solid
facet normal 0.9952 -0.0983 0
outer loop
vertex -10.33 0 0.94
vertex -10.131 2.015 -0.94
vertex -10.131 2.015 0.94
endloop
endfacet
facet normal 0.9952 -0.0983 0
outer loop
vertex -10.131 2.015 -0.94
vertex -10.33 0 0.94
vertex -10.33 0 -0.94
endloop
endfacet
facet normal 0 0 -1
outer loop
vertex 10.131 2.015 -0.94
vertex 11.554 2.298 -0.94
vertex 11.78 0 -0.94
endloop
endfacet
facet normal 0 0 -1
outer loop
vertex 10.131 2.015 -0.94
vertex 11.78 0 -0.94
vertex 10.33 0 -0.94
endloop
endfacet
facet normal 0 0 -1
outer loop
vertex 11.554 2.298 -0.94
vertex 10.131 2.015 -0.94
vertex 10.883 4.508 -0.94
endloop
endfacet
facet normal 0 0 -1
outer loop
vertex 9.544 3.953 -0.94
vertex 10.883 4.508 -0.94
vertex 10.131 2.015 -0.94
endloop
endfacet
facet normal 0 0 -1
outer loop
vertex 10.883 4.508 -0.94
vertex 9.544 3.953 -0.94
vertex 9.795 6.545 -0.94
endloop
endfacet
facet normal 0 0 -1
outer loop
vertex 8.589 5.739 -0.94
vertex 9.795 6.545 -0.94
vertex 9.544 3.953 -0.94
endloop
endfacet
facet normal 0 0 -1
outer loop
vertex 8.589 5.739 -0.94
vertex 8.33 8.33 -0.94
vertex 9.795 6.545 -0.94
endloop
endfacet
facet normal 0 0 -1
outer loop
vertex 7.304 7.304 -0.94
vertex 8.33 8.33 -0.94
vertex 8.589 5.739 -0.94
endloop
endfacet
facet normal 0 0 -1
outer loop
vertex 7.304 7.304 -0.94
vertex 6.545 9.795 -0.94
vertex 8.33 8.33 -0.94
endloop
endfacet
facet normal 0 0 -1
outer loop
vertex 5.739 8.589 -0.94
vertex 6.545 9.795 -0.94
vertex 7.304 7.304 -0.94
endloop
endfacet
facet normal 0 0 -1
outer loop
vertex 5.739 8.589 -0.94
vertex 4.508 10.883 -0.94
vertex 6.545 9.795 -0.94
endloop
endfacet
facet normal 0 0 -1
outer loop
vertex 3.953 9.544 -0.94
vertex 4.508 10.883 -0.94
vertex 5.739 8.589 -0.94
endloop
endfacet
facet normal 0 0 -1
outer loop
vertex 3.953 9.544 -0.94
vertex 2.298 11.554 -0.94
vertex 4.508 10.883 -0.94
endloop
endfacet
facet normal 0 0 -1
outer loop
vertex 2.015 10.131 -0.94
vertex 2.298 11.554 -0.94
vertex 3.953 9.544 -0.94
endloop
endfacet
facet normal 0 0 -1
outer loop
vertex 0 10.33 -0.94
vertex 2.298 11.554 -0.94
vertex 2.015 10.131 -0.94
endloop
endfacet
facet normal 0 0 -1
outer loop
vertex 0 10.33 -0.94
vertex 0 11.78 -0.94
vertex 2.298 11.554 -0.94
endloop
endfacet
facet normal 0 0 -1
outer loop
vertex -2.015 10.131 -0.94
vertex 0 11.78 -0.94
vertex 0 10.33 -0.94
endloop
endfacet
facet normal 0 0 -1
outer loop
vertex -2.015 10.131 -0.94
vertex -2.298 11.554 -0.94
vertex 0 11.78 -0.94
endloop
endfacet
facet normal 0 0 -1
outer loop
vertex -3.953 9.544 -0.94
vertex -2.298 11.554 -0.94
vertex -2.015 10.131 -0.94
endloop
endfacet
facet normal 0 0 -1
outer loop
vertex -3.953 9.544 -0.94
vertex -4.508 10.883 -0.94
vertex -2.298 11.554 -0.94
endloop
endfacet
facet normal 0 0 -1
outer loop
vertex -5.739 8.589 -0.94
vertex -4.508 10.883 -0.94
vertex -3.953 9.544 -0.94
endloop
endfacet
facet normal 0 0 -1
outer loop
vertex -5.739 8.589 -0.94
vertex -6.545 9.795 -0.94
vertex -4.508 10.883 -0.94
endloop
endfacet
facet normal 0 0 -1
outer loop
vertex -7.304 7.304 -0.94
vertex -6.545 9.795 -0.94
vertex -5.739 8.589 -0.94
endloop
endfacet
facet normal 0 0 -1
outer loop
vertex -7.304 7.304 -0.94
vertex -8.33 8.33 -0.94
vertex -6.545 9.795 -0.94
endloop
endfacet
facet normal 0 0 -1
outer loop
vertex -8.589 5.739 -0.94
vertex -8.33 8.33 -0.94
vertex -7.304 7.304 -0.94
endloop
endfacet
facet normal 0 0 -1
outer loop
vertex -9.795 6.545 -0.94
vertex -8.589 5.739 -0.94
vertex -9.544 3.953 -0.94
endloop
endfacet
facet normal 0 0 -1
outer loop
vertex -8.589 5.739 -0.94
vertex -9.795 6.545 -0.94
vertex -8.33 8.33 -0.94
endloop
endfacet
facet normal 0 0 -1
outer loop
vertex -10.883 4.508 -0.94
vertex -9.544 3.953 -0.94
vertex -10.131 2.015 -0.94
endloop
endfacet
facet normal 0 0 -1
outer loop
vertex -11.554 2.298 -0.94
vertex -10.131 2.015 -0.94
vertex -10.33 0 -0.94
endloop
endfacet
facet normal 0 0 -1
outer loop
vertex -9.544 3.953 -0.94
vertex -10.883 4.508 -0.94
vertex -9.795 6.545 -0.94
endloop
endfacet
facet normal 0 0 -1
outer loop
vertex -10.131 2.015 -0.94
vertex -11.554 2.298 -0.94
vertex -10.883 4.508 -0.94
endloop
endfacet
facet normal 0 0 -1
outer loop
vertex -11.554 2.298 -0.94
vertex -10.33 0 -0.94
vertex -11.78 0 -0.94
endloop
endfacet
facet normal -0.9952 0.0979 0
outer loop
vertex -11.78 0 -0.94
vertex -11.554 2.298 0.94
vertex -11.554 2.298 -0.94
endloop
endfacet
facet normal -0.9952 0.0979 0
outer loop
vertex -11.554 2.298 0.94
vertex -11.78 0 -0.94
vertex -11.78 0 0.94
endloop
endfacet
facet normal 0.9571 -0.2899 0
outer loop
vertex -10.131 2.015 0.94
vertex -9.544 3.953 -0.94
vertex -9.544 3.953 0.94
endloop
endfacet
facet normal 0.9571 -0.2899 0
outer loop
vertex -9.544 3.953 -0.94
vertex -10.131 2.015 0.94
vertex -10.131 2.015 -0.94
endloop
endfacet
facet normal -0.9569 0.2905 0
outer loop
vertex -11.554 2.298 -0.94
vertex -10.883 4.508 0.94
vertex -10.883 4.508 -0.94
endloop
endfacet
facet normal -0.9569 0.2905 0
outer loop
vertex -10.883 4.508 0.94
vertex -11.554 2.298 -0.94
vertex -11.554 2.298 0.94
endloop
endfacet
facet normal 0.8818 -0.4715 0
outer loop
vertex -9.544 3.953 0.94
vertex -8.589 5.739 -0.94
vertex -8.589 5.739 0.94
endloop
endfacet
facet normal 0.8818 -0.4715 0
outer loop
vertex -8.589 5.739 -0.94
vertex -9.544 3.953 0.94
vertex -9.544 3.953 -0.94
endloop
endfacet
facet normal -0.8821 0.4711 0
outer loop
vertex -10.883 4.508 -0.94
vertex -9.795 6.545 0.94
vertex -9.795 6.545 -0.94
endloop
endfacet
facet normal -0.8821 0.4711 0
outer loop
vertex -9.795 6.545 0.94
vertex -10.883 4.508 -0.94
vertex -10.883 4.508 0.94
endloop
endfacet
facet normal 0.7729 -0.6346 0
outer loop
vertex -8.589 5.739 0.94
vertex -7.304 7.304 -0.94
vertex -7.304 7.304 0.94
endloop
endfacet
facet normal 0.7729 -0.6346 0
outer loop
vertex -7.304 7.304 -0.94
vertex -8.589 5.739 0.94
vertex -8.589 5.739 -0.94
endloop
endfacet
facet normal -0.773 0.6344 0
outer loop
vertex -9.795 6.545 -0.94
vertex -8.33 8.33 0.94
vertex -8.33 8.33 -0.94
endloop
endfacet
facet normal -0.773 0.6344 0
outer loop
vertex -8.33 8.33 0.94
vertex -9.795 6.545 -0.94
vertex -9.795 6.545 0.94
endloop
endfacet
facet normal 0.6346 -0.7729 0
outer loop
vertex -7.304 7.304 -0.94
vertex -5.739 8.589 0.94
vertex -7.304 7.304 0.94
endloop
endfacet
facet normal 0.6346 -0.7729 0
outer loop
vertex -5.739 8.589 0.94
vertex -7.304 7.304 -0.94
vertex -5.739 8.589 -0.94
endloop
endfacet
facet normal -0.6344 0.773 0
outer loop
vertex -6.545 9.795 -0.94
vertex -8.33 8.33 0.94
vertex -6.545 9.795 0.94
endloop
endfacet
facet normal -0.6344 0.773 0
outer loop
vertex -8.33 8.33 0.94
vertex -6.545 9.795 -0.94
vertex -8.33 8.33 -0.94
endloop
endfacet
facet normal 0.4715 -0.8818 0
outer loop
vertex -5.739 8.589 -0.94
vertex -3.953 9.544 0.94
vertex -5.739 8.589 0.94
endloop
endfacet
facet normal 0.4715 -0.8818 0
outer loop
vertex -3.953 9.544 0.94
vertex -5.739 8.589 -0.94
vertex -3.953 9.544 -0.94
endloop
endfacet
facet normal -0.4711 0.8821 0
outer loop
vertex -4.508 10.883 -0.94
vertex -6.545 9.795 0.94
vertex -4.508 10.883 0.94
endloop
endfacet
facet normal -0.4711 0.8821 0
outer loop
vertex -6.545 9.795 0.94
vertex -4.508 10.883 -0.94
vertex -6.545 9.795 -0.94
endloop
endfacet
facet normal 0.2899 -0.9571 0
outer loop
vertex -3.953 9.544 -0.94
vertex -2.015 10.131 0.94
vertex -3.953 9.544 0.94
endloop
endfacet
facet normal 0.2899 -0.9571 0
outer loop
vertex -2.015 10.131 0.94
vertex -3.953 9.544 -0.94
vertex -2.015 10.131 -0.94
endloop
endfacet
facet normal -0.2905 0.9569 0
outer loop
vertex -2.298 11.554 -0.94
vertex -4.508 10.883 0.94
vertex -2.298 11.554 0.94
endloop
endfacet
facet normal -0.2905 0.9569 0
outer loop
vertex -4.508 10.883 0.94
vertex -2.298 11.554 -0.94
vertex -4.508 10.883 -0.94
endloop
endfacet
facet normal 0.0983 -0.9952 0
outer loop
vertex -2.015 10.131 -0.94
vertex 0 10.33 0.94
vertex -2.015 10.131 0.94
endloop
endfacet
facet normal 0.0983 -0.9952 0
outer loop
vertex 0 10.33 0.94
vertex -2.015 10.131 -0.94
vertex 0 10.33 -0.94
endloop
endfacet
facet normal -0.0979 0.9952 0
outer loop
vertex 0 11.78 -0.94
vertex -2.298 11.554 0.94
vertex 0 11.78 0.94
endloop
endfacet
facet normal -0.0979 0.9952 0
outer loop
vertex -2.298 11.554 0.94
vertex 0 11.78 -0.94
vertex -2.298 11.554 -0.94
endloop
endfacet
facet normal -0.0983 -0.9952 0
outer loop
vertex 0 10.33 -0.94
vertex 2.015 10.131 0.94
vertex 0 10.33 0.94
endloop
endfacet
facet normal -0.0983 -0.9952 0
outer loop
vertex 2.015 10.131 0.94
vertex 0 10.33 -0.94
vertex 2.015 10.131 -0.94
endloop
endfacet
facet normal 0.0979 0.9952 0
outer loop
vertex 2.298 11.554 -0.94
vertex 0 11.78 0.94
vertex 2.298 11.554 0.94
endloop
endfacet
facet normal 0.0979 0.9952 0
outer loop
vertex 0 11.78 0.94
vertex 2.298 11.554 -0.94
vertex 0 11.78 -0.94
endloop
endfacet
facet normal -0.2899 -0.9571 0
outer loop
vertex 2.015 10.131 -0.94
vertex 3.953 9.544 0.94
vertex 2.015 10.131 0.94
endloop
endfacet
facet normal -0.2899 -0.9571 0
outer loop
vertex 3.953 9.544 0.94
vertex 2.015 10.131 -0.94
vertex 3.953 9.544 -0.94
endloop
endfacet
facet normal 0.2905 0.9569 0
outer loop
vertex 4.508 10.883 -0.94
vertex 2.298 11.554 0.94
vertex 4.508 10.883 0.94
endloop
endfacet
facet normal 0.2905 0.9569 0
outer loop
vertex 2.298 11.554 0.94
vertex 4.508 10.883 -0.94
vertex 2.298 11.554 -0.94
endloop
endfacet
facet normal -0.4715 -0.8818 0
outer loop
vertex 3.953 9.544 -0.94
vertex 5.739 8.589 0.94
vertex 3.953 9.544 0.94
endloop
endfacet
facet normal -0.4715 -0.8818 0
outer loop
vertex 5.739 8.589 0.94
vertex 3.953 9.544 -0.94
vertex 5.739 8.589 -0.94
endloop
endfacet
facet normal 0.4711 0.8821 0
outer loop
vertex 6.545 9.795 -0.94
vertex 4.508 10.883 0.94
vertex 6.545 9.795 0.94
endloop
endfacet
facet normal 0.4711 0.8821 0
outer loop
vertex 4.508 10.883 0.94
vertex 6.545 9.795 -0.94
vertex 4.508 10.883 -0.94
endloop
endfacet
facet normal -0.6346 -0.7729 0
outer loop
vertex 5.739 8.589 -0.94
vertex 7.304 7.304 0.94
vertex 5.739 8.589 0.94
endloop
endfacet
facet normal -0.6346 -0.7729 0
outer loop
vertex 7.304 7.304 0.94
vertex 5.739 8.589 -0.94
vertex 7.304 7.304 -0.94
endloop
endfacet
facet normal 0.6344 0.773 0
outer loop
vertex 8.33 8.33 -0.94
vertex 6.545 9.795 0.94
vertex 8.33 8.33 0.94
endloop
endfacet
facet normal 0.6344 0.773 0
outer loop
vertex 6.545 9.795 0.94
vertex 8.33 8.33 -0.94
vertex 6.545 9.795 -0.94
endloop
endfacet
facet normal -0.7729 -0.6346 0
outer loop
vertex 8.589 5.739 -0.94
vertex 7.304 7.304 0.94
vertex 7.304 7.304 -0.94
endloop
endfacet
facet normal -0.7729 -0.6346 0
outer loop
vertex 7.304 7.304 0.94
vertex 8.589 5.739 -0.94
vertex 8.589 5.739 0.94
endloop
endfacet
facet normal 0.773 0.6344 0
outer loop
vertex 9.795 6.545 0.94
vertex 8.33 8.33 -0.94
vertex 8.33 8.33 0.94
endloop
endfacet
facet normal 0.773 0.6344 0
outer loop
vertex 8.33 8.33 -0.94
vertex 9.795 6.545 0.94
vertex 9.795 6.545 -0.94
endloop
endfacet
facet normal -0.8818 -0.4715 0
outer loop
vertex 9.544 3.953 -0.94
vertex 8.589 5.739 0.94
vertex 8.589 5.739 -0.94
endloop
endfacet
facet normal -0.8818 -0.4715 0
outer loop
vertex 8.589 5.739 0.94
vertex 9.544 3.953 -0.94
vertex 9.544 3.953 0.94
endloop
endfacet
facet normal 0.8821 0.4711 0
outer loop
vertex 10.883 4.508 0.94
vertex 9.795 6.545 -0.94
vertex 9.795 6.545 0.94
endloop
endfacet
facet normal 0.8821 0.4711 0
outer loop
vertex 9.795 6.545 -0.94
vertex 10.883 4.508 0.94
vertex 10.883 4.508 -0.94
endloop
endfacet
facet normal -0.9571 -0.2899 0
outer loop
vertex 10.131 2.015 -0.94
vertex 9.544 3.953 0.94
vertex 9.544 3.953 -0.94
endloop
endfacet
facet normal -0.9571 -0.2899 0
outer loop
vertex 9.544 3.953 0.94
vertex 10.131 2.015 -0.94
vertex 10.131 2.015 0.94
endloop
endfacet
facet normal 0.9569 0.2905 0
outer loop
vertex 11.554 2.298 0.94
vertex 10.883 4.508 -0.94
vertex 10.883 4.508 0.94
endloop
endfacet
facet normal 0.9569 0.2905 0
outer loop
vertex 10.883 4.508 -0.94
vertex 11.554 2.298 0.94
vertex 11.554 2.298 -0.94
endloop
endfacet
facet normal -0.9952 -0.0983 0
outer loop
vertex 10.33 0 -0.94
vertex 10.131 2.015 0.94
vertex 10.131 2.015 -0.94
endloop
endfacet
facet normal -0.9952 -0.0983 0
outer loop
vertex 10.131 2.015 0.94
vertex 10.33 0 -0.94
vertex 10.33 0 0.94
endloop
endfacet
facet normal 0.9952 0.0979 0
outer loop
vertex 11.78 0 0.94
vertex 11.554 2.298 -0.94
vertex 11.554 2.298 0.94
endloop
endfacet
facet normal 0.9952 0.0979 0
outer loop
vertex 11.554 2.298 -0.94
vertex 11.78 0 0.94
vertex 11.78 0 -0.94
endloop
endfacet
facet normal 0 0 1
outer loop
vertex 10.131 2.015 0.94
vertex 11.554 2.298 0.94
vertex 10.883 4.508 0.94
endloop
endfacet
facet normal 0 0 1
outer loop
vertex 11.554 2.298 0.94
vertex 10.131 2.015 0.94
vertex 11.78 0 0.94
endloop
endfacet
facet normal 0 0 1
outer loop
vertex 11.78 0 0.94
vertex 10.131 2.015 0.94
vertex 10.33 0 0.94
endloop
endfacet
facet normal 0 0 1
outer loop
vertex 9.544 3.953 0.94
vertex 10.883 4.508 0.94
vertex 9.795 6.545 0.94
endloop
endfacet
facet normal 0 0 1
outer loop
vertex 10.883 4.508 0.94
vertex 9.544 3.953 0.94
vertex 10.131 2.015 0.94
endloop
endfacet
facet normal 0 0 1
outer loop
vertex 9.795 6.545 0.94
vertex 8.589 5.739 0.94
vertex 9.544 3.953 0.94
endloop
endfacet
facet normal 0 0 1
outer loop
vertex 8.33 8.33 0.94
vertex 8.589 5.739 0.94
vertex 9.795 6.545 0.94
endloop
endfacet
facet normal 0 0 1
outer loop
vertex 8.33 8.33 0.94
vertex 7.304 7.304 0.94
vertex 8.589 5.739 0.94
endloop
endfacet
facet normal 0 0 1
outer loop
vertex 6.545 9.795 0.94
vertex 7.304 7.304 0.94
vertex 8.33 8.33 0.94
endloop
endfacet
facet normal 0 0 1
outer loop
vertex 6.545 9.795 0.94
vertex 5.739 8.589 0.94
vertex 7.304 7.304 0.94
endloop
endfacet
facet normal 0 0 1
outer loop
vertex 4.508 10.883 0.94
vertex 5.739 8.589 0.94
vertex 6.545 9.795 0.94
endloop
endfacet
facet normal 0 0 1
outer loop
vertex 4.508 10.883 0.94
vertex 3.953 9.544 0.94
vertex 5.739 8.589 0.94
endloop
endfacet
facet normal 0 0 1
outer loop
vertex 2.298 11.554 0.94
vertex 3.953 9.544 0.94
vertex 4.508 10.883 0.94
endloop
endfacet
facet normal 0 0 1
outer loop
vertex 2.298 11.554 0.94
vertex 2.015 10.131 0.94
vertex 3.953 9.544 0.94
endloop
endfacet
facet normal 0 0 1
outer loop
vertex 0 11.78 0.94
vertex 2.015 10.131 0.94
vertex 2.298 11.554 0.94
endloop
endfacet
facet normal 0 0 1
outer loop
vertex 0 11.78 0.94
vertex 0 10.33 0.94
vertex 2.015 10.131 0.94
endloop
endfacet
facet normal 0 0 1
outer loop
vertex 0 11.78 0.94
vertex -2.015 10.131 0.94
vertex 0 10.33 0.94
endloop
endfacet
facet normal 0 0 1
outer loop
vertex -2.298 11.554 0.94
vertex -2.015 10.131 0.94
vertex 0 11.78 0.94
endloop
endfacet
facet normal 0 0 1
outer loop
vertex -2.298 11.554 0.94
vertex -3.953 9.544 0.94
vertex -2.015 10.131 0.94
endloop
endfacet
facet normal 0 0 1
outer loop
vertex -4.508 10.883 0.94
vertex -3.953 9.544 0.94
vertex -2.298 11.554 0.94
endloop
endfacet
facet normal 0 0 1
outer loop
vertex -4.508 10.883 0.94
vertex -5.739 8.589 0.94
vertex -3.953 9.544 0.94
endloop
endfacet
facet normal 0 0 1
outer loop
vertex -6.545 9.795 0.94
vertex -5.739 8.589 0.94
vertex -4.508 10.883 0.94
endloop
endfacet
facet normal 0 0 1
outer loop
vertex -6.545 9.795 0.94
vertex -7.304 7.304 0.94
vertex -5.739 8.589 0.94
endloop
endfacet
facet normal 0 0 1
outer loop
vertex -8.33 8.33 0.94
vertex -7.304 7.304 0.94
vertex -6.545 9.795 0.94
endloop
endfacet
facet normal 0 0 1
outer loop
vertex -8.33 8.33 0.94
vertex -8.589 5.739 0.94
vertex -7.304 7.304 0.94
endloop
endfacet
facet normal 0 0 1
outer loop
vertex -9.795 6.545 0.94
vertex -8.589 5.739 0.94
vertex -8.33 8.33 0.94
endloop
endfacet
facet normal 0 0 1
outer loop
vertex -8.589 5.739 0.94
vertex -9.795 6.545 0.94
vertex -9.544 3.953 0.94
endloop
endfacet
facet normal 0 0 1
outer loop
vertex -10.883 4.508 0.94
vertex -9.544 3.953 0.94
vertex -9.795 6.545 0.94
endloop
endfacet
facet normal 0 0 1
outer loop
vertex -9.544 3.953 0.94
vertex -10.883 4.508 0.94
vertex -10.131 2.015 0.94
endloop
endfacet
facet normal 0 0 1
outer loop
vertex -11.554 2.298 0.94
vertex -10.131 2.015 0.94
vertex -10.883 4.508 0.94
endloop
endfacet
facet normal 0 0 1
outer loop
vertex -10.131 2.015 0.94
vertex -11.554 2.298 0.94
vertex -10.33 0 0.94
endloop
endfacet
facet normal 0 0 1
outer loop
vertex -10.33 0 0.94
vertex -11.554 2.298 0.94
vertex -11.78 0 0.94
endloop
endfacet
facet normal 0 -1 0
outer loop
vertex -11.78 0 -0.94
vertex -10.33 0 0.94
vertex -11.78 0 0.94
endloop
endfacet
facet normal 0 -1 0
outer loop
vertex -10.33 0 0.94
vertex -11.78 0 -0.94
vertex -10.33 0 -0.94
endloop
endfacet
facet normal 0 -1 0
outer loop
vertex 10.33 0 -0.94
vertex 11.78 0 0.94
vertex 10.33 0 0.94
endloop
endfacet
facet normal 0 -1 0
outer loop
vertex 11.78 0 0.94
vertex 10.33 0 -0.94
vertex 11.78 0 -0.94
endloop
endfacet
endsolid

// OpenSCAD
// file: ../stamp_generated.scad
// AUTO-GENERATED by scripts/Export-OpenScadStl.ps1 - do not edit by hand
// Source: print-stamp-config.json

info_stamp_line1 = "Verminology";
info_stamp_line2 = "Liquid Bait Station";
info_stamp_line3 = "v2.4.1 Prototype";
reservoir_stamp_bottom = false;
station_stamp_bottom = true;
needle_insert_export_stamp_bottom = false;
needle_gasket_export_stamp_bottom = false;
needle_seal_stamp_bottom = false;
// file: needle-insert.scad
// Needle insert + gasket ring modules. Include this (not `use`) so common.scad loads.
// F5 / STL: open this file directly — draws needle_insert() unless needle_insert_as_library is true before include.
// Base: union of two cylinders — bottom 1 mm @ inner_bait_barrier_id, upper 2 mm @ bottom OD − 2 mm (diametric).

include <common.scad>

// TPU torus: relaxed inner R < upper step R, outer R > upper step R. Centered on z=0; mate with translate(…, needle_gasket_assembly_z).
module needle_gasket_ring() {
    ri = needle_gasket_relaxed_inner_r;
    ro = needle_gasket_relaxed_outer_r;
    hz = needle_gasket_relaxed_z_half;
    render_if_needed()
        rotate_extrude(angle = 360, convexity = 4)
            polygon([
                [ri, -hz],
                [ro, -hz],
                [ro, hz],
                [ri, hz],
            ]);
}

// Six flex posts on upper base step (gasket land OD); top barb: two ramps at needle_insert_clip_top_barb_slope_deg, extruded across w.
module needle_insert_retention_clip_top_barb(L, w, h_barb, apex_r) {
    hm = h_barb / 2;
    translate([0, w / 2, 0])
        rotate([90, 0, 0])
            linear_extrude(height = w, convexity = 4)
                polygon([
                    [0, 0],
                    [L, 0],
                    [L + apex_r, hm],
                    [L, h_barb],
                    [0, h_barb],
                ]);
}

module needle_insert_retention_clips() {
    R = needle_insert_gasket_land_od / 2;
    w = needle_insert_clip_tangent_width_mm;
    ad = needle_insert_clip_anchor_depth_mm;
    stem = needle_insert_clip_stem_radial_mm;
    L = ad + stem;
    h_barb = needle_insert_clip_top_barb_h_mm;
    apex_r = needle_insert_clip_top_barb_apex_radial_mm;
    z_step = needle_insert_base_bottom_h;
    z0 = needle_insert_clip_z0_above_gasket_step_mm + needle_insert_clip_stem_bottom_trim_mm;
    z_body_top = needle_insert_clip_body_z_top - z_step;
    z_barb_base = z_body_top - needle_insert_clip_top_barb_drop_mm;
    ri = needle_insert_clip_retention_radial_inset_mm;
    assert(z_barb_base > z0 + 0.05, "barb drop too large vs stem height");
    for (i = [0 : needle_insert_clip_count - 1])
        rotate([0, 0, needle_insert_clip_phase_deg + i * (360 / needle_insert_clip_count)])
            render_if_needed()
                translate([0, 0, z_step])
                    union() {
                        translate([R - L - ri, -w / 2, z0])
                            cube([L, w, z_barb_base - z0]);
                        translate([R - L - ri, 0, z_barb_base])
                            needle_insert_retention_clip_top_barb(L, w, h_barb, apex_r);
                    }
}

// Lower base step — plain cylinder only (no groove, no difference).
module needle_insert_base_bottom_cylinder() {
    cylinder(h = needle_insert_base_bottom_h, d = needle_insert_base_bottom_od);
}

// Upper base step — second cylinder only (stacked on bottom).
module needle_insert_base_upper_cylinder() {
    translate([0, 0, needle_insert_base_bottom_h])
        cylinder(h = needle_insert_base_gasket_step_h, d = needle_insert_gasket_land_od);
}

module needle_insert_channels() {
    // Vertical: from bottom of lateral port up (not through z=0 below lateral).
    vb = max(0, pin_channel_z_bottom);
    vh = pin_top + 0.5 - vb;
    translate([0, 0, vb])
        cylinder(h = vh, d = pin_channel_dia);
    translate([pin_tunnel_x_center, 0, pin_tunnel_z])
        rotate([0, 90, 0])
            cylinder(h = pin_tunnel_reach, d = pin_channel_dia, center = true);
}

// Solid: union(two base cylinders, pin…); channels subtract through the stack.
module needle_insert() {
    sh = pin_top - pin_tip_taper_h - needle_insert_disk_h;
    render_if_needed()
        difference() {
            union() {
                needle_insert_base_bottom_cylinder();
                needle_insert_base_upper_cylinder();
                translate([0, 0, needle_insert_disk_h]) {
                    cylinder(h = sh, d = pin_dia);
                    translate([0, 0, sh])
                        cylinder(h = pin_tip_taper_h, d1 = pin_dia, d2 = pin_tip_od);
                }
                if (needle_insert_retention_clips_enabled)
                    needle_insert_retention_clips();
            }
            needle_insert_channels();
        }
}

// Pocket: max of (bottom OD, land + barb) + clearance — not id2+c+apex as extra (that oversize erased inner barrier ring).
// Capped below inner barrier ring OD so the subtract cannot hollow the full annulus (watertight wall).
module needle_insert_pocket() {
    c = needle_insert_pocket_clearance;
    ze = needle_insert_pocket_z_extra;
    r_body = needle_insert_base_bottom_od / 2 + c;
    r_barb = needle_insert_retention_clips_enabled
        ? needle_insert_gasket_land_od / 2 + needle_insert_clip_top_barb_apex_radial_mm + c
            - needle_insert_clip_retention_radial_inset_mm
        : 0;
    r_need = max(r_body, r_barb);
    r_cap = inner_bait_barrier_od / 2 - needle_insert_pocket_inner_barrier_min_wall_mm;
    r_clip = min(r_need, r_cap);
    assert(r_need <= r_cap + 0.02, "needle pocket exceeds inner barrier OD cap — reduce barb apex or slope");
    z_barb = needle_insert_retention_clips_enabled ? needle_insert_clip_top_barb_h_mm : 0;
    z_drop = needle_insert_retention_clips_enabled ? needle_insert_clip_top_barb_drop_mm : 0;
    z_clip_top = max(
        inner_barrier_rail_z_top + 0.08,
        needle_insert_clip_body_z_top - z_drop + z_barb + needle_insert_pocket_z_above_clip_post_mm);
    translate([0, 0, -0.02])
        union() {
            cylinder(h = z_clip_top + 0.02 + ze, r = r_clip);
            translate([0, 0, z_clip_top])
                cylinder(h = pin_top - z_clip_top + 0.5 + ze, d = pin_dia + 2 * c);
        }
}

if (is_undef(needle_insert_as_library) || !needle_insert_as_library)
    needle_insert();
// main file
// Needle insert base TPU ring — print ~90A. Torus: stretch over upper base step OD (no groove on insert).

needle_insert_as_library = true;
include <needle-insert.scad>

crosssection(needle_insert_base_bottom_od) needle_gasket_ring();
